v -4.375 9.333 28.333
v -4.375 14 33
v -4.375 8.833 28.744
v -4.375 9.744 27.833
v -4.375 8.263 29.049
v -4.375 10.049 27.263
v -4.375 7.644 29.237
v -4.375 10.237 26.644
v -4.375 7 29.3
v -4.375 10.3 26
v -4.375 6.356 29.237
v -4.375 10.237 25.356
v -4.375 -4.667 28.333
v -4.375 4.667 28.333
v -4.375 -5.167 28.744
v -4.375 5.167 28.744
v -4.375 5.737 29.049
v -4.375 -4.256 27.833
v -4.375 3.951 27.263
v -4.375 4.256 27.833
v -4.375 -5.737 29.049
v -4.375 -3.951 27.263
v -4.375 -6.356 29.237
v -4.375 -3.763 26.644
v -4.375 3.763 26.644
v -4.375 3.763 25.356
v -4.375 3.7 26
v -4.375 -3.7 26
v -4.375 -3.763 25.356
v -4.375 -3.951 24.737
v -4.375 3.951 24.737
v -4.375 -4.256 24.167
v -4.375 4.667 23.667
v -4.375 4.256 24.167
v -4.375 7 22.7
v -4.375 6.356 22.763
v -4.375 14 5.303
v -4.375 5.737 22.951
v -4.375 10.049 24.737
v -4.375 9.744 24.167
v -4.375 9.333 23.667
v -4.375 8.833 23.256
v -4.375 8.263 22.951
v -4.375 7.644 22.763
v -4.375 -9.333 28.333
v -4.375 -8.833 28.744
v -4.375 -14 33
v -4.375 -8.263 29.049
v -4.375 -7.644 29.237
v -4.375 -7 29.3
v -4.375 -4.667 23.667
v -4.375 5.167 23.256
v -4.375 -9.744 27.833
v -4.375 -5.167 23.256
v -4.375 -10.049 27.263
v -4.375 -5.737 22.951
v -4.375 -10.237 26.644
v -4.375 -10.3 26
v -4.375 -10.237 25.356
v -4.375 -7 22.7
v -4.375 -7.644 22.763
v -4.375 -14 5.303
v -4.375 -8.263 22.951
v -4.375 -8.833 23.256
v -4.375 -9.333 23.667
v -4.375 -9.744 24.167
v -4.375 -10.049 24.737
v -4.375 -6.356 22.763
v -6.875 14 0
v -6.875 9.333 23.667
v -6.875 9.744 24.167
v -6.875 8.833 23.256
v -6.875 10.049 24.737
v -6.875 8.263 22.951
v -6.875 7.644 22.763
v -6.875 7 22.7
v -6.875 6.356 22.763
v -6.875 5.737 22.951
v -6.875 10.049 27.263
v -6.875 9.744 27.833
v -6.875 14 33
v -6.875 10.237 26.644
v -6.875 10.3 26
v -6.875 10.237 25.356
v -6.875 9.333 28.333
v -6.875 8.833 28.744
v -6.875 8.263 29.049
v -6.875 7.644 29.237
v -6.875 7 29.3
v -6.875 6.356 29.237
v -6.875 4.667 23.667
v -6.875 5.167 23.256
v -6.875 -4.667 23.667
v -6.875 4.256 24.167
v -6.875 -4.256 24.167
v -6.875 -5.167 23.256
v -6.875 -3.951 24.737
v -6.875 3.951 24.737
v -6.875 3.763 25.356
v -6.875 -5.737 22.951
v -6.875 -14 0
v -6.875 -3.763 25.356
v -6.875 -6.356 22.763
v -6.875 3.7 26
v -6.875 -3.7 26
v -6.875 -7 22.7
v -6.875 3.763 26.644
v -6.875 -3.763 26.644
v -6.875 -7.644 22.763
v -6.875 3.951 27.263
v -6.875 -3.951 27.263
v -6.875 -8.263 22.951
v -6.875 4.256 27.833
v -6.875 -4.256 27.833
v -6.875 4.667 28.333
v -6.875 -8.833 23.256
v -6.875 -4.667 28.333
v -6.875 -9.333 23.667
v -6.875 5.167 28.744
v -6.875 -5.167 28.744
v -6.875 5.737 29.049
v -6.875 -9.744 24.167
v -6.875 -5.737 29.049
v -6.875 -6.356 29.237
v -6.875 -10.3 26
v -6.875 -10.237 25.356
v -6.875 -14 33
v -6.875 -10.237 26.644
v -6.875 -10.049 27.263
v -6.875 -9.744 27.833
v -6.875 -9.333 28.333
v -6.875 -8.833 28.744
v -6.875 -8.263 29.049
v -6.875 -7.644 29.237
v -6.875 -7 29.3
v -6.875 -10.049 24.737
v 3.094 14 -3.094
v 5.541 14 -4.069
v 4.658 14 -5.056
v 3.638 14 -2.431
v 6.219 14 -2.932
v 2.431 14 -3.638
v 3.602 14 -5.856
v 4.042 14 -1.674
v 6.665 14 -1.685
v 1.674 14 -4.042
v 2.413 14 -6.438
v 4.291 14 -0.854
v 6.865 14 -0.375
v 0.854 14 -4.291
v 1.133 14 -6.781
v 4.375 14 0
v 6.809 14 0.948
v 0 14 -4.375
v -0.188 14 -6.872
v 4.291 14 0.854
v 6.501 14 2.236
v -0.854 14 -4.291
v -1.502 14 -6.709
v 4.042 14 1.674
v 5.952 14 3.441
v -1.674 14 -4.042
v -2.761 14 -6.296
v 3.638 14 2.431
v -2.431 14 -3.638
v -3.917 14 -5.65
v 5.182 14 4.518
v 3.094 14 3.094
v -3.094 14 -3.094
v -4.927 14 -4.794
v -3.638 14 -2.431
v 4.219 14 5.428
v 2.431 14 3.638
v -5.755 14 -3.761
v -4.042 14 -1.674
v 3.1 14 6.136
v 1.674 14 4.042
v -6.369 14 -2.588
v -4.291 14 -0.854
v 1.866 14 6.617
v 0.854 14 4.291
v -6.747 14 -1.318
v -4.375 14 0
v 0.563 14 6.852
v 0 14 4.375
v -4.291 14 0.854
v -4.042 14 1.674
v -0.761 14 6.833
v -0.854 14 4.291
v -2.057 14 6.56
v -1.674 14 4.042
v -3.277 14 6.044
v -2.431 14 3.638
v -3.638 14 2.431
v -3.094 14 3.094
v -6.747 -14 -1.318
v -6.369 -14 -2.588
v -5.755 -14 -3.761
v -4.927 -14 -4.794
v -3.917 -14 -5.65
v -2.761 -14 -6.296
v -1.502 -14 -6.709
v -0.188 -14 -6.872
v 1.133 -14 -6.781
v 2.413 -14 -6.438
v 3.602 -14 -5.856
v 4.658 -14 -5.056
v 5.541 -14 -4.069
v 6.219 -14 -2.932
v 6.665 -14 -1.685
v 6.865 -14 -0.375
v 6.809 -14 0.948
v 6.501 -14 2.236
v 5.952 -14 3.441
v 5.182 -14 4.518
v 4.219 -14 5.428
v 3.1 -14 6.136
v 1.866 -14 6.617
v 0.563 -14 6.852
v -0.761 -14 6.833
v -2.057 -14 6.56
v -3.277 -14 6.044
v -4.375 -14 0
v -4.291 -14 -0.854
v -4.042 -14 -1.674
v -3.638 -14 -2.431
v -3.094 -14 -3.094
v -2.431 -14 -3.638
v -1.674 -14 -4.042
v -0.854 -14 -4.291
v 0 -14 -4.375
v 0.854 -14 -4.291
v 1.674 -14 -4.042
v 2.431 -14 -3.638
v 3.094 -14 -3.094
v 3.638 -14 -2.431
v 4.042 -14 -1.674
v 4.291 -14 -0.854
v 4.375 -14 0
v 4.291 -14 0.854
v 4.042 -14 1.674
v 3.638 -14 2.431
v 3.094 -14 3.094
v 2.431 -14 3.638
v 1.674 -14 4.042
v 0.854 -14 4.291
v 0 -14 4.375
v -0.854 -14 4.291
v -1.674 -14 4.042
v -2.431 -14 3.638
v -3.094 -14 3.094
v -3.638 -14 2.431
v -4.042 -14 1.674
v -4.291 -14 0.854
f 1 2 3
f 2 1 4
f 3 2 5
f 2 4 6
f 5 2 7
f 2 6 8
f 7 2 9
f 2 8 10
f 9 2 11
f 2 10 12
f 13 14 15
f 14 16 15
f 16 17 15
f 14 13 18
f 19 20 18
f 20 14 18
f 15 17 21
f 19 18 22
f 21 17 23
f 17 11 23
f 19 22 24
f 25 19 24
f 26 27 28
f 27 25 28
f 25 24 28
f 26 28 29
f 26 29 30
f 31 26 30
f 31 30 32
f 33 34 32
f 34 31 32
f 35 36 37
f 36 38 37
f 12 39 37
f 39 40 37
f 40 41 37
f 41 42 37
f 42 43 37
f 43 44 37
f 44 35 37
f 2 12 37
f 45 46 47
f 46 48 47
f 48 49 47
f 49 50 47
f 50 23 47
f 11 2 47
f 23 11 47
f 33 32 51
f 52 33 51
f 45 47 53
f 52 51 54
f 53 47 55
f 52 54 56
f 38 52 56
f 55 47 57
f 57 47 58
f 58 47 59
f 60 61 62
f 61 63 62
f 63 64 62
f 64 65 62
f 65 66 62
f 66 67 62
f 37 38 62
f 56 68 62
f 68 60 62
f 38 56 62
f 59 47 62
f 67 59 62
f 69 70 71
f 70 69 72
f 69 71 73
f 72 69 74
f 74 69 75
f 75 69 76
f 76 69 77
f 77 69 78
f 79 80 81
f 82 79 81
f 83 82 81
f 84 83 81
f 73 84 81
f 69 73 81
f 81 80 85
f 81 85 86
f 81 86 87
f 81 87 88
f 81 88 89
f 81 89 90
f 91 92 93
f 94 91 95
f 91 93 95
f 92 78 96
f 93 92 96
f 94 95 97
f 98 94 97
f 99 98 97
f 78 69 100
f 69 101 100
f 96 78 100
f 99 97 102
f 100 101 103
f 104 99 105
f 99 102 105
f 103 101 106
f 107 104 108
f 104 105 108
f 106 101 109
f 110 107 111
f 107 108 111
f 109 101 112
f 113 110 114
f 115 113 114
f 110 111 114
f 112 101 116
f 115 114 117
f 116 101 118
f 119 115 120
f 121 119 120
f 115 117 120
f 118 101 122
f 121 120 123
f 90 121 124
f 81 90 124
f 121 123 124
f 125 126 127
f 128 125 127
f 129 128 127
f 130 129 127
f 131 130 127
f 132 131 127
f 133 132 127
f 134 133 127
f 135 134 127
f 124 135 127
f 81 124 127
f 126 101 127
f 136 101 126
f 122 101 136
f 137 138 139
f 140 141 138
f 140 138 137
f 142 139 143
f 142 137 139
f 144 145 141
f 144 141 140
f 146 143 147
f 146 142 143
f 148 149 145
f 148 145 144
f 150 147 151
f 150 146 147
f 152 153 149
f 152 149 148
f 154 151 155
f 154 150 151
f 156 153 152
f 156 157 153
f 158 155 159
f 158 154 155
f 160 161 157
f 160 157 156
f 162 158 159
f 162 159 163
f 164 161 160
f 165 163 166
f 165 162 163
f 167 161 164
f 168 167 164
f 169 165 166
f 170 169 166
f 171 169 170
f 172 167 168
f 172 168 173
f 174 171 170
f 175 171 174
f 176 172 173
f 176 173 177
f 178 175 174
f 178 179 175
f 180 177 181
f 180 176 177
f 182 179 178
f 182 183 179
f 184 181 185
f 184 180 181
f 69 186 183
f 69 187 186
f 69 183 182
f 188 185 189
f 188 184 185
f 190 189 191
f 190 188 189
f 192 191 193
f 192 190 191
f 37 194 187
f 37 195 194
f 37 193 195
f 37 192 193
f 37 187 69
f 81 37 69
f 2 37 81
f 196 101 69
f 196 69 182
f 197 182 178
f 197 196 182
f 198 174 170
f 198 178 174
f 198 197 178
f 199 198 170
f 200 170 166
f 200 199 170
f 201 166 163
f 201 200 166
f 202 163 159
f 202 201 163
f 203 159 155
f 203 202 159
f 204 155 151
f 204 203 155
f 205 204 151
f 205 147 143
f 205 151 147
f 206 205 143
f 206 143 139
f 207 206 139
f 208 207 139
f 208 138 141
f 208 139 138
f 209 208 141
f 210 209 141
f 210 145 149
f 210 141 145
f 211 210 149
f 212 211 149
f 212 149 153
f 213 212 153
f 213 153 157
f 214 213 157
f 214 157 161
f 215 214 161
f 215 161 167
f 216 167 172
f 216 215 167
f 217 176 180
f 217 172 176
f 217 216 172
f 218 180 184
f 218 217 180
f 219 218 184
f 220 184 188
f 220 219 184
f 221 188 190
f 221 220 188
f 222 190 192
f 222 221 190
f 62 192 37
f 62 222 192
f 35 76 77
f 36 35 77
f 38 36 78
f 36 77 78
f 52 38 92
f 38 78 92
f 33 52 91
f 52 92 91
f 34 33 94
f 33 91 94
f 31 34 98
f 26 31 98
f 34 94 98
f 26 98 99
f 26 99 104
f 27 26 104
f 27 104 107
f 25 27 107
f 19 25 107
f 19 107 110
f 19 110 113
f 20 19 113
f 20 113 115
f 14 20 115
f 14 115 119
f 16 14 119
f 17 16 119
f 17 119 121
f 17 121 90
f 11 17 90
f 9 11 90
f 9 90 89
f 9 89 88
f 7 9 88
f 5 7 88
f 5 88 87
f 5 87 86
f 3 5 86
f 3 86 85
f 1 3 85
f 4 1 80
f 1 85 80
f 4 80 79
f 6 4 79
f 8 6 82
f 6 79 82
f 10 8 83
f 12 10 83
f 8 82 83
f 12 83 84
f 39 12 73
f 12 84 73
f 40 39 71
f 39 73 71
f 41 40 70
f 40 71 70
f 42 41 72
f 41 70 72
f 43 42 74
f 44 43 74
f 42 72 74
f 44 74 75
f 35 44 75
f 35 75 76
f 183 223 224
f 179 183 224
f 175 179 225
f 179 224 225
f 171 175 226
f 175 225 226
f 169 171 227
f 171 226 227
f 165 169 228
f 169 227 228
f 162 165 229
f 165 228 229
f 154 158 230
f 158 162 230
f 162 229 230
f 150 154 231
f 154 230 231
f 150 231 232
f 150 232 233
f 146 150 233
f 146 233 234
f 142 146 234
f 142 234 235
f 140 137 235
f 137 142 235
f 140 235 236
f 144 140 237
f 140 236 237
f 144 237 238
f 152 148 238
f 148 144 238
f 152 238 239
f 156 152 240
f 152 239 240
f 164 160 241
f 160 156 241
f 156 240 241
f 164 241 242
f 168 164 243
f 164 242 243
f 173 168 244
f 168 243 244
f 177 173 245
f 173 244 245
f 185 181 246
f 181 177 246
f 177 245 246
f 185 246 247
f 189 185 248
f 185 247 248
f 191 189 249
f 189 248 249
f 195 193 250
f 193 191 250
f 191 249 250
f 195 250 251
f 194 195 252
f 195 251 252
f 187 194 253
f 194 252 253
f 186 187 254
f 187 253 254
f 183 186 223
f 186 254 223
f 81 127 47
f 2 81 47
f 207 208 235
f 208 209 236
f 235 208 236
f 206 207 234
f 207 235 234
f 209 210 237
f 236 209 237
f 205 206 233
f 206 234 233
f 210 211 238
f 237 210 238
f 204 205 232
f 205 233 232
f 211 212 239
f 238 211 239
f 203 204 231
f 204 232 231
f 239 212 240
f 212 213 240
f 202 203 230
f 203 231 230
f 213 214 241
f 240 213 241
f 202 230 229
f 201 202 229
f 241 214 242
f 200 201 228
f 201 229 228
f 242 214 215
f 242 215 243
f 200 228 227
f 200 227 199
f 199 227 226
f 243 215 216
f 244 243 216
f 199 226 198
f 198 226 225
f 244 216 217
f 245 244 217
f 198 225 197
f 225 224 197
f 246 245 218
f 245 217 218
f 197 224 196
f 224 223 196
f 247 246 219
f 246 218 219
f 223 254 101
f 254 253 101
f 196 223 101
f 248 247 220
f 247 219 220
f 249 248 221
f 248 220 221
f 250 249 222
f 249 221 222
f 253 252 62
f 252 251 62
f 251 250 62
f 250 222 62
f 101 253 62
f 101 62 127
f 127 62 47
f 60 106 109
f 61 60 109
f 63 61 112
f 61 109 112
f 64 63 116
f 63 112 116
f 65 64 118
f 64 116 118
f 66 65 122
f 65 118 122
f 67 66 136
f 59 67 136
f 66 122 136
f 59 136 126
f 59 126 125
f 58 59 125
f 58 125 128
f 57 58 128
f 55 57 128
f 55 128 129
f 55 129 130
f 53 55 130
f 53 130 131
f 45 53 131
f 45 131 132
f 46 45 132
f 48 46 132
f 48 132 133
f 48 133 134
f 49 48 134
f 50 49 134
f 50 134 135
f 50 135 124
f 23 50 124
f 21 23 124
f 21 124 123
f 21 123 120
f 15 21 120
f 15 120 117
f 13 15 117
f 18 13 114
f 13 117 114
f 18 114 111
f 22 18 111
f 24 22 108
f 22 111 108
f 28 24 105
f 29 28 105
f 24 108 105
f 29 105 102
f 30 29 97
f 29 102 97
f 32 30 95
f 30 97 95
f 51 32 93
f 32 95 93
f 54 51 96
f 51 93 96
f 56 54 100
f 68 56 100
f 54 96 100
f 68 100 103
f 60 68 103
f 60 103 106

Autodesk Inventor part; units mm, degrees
ref_plane "YZ Plane" through (0, 0, 0) normal (1, 0, 0) x (0, 1, 0)
ref_plane "XZ Plane" through (0, 0, 0) normal (0, 1, 0) x (-1, 0, 0)
ref_plane "XY Plane" through (0, 0, 0) normal (0, 0, 1) x (1, 0, 0)
sketch "Sketch1" plane through (0, 0, 0) normal (0, 1, 0) x (-1, 0, 0)
  circle A0 centre (0, 0) radius 3.875
  circle A1 centre (0, 0) radius 4.375
  circle A2 centre (0, 0) radius 6.875
  line L0 (6.875, 0) -> (6.875, 33)
  line L1 (6.875, 33) -> (4.375, 33)
  line L2 (4.375, 33) -> (4.375, 5.3033)
  dimension "d0" = 7.75
  dimension "d1" = 8.75
  dimension "d2" = 13.75
  dimension "d3" = 33
  dimension "d4" = 2.5
extrude "Extrusion1" add sketch "Sketch1" along normal mid plane 28 contours A2 | A2 L2 L1 L0
sketch "Sketch4" plane through (-4.375, -14, 33) normal (1, 0, 0) x (0, 0, -1)
  line L0 (0, 28) -> (27.6967, 28) projected
  line L1 (0, 0) -> (0, 28) projected
  line L2 (0, 14) -> (27.6967, 14)
  line L3 (0, 14) -> (7, 14)
  line L4 (7, 14) -> (7, 7)
  line L5 (7, 14) -> (7, 21)
  point P0 (33, 14)
  dimension "d7" = 14
  dimension "d17" = 7
  dimension "d18" = 7
  dimension "d19" = 7
hole "Hole1" at (-4.375, -7, 26) at (-4.375, 7, 26) direction (-1, 0, 0) diameter 6.6 end up to surface clearance for "Countersunk Flat Head Screw ISO 2009/7046" size "M6" standard "ISO"
properties part number "SP29V1 Bisagra P1" material "Steel"
